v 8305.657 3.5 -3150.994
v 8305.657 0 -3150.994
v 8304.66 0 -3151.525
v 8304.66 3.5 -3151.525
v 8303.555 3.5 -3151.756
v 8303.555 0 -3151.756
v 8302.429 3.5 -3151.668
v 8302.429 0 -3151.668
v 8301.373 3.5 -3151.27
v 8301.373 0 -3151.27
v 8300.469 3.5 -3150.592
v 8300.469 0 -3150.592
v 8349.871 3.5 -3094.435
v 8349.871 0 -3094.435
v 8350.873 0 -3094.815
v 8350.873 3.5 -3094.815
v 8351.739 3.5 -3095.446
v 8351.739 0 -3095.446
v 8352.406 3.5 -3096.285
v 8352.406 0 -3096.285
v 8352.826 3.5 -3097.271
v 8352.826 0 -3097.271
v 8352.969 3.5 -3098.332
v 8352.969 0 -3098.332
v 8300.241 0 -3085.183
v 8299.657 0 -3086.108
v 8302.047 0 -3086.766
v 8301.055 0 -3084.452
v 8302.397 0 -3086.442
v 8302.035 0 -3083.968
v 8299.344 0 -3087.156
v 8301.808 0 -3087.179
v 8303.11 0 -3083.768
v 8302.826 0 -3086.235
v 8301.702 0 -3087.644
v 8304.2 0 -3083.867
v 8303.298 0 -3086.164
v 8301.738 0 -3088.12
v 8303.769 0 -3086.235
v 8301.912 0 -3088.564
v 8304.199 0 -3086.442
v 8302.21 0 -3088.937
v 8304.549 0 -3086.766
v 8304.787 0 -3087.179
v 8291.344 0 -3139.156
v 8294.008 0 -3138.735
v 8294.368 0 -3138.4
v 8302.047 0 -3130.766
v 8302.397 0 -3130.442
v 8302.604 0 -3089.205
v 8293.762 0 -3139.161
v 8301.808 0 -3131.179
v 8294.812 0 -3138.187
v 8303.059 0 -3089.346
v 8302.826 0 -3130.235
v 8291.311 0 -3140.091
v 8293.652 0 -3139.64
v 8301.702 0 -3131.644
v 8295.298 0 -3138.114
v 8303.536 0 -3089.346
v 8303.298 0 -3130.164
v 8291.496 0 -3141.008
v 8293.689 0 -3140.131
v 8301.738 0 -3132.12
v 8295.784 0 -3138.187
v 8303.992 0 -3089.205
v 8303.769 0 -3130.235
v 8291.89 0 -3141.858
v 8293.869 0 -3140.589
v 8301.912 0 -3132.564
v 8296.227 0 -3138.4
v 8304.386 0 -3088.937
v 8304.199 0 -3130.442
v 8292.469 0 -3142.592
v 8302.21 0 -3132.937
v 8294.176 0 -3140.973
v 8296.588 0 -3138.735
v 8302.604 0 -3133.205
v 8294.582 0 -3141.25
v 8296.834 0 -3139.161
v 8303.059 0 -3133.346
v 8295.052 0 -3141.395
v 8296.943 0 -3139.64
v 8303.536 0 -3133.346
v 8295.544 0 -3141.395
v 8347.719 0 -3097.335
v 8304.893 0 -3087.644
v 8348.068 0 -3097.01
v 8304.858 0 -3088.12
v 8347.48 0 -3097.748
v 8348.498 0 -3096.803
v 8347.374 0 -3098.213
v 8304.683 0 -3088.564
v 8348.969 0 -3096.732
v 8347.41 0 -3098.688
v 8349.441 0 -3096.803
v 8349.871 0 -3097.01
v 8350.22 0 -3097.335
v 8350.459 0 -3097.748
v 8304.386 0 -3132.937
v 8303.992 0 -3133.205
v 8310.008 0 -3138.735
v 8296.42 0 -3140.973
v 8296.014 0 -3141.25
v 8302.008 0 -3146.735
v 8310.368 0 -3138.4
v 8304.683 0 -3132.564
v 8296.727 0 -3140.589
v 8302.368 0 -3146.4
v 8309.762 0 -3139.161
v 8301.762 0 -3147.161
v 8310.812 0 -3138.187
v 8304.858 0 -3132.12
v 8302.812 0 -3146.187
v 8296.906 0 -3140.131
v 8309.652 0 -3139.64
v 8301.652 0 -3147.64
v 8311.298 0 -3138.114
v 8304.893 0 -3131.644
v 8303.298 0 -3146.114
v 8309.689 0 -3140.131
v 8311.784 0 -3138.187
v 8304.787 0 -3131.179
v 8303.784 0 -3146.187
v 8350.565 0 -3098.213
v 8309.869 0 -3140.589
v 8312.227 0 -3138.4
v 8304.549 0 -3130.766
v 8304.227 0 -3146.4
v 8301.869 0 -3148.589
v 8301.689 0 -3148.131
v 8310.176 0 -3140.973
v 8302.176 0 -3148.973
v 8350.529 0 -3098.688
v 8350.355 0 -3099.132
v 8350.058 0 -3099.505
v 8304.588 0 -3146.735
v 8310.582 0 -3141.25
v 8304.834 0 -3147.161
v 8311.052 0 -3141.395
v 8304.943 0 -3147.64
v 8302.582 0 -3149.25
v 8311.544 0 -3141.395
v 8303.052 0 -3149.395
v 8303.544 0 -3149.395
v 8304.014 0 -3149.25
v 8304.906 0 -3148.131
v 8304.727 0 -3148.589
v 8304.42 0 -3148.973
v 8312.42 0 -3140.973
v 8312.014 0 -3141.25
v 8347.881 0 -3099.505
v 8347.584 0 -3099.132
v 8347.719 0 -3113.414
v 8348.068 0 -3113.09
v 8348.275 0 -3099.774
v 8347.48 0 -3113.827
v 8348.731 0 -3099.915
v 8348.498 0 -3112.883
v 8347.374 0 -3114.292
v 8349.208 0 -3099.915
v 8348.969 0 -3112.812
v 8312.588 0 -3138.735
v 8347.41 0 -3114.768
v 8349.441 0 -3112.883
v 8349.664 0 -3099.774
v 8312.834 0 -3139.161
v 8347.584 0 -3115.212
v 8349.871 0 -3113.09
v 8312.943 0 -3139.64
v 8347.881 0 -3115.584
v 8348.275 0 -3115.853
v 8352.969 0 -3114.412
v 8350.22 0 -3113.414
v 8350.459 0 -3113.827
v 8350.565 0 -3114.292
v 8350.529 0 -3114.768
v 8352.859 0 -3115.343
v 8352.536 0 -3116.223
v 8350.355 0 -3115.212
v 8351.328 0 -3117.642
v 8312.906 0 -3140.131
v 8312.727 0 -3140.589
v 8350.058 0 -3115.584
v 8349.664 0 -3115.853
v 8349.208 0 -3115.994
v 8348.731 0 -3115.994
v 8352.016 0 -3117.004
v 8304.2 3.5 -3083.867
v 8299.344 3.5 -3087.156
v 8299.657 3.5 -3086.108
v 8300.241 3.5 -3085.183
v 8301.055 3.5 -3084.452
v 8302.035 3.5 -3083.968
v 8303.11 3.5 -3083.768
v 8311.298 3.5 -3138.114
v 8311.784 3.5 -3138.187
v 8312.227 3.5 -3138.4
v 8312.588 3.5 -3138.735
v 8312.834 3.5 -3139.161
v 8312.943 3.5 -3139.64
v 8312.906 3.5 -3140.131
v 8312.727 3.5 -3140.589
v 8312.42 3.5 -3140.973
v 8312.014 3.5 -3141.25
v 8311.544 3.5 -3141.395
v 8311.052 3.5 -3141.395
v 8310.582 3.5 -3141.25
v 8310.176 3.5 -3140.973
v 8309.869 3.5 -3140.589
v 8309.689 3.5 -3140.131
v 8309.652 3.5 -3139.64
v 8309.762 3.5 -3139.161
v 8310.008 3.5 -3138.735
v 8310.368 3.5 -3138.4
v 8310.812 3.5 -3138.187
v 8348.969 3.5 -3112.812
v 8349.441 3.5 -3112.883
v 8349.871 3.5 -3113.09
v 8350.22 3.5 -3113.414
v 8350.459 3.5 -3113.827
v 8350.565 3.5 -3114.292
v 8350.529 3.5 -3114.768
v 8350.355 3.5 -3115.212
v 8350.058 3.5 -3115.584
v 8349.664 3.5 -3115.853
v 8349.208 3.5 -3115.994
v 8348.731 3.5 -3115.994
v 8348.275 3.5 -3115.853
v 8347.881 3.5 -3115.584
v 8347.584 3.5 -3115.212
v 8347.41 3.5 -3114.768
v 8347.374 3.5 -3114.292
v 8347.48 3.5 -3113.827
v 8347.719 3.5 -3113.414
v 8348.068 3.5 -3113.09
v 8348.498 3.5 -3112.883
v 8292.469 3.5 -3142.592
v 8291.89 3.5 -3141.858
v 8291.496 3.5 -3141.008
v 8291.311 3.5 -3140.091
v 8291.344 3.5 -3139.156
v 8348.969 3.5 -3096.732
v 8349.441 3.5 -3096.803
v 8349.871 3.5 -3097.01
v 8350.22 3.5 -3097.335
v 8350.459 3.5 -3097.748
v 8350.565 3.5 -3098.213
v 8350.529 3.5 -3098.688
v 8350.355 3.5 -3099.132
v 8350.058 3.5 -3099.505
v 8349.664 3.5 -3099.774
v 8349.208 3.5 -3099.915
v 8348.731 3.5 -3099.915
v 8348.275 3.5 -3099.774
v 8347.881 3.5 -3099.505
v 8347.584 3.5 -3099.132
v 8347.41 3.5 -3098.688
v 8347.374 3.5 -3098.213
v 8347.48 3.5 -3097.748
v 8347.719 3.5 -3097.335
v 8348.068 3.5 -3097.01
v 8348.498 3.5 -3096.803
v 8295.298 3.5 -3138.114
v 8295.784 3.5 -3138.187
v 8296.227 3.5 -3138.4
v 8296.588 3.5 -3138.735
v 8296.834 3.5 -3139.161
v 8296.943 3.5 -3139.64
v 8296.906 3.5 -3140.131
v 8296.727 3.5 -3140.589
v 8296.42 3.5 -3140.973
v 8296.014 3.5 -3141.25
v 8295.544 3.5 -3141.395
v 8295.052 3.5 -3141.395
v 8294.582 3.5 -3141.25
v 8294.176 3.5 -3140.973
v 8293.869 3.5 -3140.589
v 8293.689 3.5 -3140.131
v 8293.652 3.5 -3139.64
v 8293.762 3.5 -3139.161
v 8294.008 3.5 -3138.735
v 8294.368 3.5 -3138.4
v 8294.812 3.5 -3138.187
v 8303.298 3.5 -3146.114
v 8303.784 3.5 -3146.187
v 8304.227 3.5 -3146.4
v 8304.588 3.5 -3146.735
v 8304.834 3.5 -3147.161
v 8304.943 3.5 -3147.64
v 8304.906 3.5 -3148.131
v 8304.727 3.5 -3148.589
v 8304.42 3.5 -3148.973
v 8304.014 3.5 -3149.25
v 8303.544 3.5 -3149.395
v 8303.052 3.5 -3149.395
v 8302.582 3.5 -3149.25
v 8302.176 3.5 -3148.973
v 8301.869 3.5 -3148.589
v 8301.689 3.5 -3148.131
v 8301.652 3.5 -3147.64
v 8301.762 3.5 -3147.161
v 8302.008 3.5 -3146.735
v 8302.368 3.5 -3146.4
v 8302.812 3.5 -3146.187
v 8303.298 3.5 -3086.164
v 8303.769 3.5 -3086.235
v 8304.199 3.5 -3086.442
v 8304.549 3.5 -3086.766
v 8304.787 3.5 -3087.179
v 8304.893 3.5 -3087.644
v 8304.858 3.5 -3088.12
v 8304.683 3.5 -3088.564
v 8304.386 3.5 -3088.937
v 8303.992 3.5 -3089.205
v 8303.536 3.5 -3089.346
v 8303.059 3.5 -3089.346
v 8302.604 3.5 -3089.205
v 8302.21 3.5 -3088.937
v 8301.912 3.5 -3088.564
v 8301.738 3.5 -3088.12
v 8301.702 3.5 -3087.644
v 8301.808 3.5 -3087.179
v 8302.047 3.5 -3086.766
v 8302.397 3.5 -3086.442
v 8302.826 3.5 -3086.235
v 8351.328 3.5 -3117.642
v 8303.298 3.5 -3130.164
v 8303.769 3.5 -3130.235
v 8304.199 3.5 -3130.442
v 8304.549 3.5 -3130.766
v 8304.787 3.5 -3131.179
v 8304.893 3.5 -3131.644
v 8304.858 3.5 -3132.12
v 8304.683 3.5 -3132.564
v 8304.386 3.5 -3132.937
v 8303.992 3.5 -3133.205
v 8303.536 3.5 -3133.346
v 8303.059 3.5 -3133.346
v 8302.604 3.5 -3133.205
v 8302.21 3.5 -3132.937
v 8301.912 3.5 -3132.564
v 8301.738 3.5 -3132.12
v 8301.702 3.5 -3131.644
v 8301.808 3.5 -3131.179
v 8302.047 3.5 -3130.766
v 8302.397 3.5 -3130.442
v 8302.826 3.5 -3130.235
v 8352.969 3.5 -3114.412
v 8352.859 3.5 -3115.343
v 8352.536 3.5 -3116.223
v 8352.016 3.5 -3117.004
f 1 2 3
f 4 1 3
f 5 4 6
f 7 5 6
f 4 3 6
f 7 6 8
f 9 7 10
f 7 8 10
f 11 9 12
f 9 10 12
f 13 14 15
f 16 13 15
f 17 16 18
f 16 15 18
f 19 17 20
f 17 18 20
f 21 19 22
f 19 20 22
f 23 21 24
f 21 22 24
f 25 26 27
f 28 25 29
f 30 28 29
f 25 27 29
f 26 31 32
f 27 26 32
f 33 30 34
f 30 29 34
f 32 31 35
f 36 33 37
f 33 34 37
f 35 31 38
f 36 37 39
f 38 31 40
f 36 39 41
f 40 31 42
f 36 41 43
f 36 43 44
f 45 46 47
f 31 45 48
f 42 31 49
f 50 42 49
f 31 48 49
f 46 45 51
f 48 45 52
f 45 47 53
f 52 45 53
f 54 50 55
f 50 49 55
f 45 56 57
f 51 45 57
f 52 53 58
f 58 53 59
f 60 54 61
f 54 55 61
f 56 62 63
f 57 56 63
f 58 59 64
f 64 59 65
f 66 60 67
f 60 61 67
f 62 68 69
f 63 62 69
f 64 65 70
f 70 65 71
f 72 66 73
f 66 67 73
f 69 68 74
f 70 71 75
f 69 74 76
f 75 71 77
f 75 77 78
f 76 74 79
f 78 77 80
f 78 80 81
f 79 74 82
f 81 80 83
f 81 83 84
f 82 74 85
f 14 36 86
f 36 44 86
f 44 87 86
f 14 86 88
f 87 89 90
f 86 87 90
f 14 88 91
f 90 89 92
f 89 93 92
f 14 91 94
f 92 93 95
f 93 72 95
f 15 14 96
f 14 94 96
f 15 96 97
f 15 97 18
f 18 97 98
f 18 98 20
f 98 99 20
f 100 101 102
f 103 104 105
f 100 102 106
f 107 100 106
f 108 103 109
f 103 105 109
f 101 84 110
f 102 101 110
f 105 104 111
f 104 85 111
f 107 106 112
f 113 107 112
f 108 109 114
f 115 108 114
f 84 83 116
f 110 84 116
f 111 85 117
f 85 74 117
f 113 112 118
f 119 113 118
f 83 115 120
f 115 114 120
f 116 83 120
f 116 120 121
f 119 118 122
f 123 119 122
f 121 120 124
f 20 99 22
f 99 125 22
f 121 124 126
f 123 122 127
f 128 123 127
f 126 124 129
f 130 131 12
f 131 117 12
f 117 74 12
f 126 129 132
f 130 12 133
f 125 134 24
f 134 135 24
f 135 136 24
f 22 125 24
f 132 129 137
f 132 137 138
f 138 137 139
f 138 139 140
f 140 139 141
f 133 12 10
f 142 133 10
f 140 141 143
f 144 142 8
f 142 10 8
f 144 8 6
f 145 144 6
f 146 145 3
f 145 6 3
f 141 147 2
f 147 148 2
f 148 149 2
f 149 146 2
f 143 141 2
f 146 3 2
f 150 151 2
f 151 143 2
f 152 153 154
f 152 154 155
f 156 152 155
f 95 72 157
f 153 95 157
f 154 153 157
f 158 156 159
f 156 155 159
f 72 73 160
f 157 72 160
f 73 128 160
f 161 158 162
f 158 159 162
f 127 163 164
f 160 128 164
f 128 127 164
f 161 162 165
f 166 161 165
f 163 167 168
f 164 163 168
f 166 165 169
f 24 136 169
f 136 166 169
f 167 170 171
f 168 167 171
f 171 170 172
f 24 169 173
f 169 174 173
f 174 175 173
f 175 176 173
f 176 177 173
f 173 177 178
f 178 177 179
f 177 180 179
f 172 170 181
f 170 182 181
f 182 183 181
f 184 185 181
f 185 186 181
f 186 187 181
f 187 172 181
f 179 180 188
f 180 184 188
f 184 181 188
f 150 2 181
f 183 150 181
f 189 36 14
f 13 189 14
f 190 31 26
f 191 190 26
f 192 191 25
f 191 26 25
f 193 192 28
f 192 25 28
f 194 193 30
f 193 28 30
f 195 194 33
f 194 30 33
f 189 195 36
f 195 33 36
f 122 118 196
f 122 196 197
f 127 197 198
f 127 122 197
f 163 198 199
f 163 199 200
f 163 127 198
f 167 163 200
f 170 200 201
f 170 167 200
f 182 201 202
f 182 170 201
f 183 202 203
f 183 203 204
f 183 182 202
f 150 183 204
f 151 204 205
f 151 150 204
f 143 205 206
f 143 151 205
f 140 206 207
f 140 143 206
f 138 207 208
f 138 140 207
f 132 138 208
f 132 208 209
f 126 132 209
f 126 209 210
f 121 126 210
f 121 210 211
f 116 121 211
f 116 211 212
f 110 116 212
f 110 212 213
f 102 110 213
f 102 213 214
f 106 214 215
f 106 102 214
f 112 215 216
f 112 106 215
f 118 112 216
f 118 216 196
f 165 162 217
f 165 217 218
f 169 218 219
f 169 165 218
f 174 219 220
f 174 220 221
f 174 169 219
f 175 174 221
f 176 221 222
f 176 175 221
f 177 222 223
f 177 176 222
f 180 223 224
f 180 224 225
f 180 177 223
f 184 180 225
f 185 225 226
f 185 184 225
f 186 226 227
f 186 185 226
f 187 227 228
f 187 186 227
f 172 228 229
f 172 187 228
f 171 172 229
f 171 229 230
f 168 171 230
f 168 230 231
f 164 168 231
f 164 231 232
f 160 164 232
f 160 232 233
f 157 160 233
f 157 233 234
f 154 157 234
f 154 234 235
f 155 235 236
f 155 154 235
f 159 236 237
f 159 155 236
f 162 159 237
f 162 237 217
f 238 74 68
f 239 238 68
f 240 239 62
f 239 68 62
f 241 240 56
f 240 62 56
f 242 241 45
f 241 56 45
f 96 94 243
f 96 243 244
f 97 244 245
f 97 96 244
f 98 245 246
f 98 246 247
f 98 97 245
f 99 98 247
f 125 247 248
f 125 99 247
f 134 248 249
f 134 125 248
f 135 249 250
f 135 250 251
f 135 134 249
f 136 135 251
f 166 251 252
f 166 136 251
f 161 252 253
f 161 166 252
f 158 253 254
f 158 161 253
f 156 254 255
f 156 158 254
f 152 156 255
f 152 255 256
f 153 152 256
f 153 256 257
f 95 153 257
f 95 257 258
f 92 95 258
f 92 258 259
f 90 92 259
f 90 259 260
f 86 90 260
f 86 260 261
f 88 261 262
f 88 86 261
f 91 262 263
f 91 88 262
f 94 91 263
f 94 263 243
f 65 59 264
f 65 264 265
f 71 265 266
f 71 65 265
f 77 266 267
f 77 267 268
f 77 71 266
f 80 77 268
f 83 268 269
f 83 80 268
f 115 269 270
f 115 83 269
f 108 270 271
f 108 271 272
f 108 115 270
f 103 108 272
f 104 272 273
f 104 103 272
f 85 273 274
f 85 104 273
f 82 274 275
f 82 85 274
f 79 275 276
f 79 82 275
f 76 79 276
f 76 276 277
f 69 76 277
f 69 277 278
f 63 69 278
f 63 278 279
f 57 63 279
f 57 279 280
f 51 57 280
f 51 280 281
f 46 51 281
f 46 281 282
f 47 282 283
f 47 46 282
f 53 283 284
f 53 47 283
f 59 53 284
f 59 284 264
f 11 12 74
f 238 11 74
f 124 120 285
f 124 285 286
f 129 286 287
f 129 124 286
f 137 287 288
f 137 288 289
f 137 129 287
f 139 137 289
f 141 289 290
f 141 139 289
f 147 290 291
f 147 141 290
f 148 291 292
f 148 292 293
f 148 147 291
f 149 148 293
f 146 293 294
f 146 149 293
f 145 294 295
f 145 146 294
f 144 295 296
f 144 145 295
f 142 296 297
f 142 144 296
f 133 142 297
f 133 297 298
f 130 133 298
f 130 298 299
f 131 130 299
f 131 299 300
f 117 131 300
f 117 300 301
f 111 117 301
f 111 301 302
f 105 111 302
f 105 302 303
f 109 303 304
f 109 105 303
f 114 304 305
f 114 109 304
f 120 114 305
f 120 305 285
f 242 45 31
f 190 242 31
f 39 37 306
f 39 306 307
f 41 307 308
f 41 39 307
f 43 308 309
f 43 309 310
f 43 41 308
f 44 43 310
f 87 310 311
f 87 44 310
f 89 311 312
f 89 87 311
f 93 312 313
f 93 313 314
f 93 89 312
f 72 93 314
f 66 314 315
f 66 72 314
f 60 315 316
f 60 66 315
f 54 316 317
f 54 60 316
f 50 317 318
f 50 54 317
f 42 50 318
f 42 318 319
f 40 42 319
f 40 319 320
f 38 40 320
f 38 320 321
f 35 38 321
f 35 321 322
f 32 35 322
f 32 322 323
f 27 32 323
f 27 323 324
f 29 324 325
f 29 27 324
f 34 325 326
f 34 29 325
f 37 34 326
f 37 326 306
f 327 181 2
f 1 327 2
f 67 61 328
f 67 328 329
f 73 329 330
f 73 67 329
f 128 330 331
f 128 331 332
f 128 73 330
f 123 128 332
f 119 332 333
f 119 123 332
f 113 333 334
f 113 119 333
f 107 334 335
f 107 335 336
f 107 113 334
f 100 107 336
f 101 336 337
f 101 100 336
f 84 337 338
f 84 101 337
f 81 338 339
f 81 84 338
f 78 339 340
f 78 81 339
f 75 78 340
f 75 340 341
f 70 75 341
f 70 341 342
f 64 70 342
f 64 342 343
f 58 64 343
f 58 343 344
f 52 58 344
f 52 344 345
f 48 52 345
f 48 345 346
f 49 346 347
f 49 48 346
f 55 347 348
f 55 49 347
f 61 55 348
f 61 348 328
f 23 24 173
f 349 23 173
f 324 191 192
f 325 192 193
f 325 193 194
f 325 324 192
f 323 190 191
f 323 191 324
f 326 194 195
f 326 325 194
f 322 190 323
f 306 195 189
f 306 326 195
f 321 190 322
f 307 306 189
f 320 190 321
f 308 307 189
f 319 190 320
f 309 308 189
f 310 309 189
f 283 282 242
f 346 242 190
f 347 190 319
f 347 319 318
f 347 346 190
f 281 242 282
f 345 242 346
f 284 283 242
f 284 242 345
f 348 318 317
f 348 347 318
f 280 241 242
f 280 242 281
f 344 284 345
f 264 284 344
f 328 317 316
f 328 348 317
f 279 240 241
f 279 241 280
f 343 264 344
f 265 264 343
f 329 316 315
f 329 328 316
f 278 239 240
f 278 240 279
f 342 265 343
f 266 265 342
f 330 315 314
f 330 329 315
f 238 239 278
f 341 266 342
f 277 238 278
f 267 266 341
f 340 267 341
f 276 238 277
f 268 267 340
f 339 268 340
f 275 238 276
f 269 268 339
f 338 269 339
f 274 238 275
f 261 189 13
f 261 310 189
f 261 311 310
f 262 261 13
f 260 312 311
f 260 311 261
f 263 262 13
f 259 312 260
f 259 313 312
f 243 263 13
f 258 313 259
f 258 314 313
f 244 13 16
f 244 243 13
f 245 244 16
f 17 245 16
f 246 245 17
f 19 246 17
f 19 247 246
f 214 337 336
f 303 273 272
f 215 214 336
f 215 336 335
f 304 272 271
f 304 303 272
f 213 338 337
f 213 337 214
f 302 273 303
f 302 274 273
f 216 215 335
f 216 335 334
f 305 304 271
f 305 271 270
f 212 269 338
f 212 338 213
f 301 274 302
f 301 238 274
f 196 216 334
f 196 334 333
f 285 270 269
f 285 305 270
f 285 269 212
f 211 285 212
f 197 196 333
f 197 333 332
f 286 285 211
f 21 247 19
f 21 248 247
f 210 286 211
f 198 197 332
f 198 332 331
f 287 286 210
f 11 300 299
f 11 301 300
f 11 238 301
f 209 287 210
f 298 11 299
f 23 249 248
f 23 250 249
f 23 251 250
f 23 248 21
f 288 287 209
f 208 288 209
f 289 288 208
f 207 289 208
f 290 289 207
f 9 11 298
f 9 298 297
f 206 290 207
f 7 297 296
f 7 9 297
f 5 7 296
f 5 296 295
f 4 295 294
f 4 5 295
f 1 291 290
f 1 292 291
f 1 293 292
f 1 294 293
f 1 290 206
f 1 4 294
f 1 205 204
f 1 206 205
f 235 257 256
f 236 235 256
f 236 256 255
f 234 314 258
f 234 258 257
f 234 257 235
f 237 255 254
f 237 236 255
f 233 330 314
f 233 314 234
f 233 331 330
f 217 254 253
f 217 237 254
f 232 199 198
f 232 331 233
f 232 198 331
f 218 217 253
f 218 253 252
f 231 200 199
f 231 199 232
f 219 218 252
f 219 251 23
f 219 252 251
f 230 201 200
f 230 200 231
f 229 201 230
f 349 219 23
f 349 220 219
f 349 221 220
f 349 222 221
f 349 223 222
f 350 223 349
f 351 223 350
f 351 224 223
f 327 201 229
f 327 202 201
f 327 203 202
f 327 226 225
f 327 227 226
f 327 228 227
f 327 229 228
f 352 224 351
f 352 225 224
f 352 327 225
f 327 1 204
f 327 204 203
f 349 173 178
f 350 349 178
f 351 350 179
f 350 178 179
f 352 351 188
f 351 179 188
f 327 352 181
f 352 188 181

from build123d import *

# Parameters (mm, degrees)
SKETCH_1_R      = 1.6
SKETCH_1_R_2    = 1.65
EXTRUDE_1_DEPTH = 3.5


with BuildPart() as part:
    # 草图1 → 凸台-拉伸1 (new body)
    with BuildSketch(Plane(origin=(0, 0, 0), x_dir=(1, 0, 0), z_dir=(0, 1, 0))):
        with BuildLine():
            Line((8304.199636281, 3083.866766782), (8349.87122342, 3094.435360284))
            ThreePointArc((8349.87122342, 3094.435360284), (8352.100502408, 3095.843120102), (8352.969436472, 3098.332382262))
            Line((8352.969436472, 3098.332382262), (8352.969436472, 3114.411583007))
            ThreePointArc((8352.969436472, 3114.411583007), (8352.5356662, 3116.223213635), (8351.328433707, 3117.641928507))
            Line((8351.328433707, 3117.641928507), (8305.656846567, 3150.99413426))
            ThreePointArc((8305.656846567, 3150.99413426), (8302.988857908, 3151.75183644), (8300.469422208, 3150.592215885))
            Line((8300.469422208, 3150.592215885), (8292.469422208, 3142.592215885))
            ThreePointArc((8292.469422208, 3142.592215885), (8291.496370678, 3141.008280638), (8291.344362542, 3139.155560023))
            Line((8291.344362542, 3139.155560023), (8299.344362542, 3087.155560023))
            ThreePointArc((8299.344362542, 3087.155560023), (8301.054579793, 3084.452030652), (8304.199636281, 3083.866766782))
        make_face()
        with Locations(Location((8348.969436472, 3098.332382262, 0), (0, 0, 270))):
            Circle(SKETCH_1_R, mode=Mode.SUBTRACT)
        with Locations(Location((8348.969436472, 3114.411583007, 0), (0, 0, 270))):
            Circle(SKETCH_1_R, mode=Mode.SUBTRACT)
        with Locations(Location((8303.297849333, 3131.76378876, 0), (0, 0, 270))):
            Circle(SKETCH_1_R, mode=Mode.SUBTRACT)
        with Locations(Location((8303.297849333, 3087.76378876, 0), (0, 0, 270))):
            Circle(SKETCH_1_R, mode=Mode.SUBTRACT)
        with Locations(Location((8303.297849333, 3147.76378876, 0), (0, 0, 270))):
            Circle(SKETCH_1_R_2, mode=Mode.SUBTRACT)
        with Locations(Location((8295.297849333, 3139.76378876, 0), (0, 0, 270))):
            Circle(SKETCH_1_R_2, mode=Mode.SUBTRACT)
        with Locations(Location((8311.297849333, 3139.76378876, 0), (0, 0, 270))):
            Circle(SKETCH_1_R_2, mode=Mode.SUBTRACT)
    extrude(amount=EXTRUDE_1_DEPTH)


solid = part.part
